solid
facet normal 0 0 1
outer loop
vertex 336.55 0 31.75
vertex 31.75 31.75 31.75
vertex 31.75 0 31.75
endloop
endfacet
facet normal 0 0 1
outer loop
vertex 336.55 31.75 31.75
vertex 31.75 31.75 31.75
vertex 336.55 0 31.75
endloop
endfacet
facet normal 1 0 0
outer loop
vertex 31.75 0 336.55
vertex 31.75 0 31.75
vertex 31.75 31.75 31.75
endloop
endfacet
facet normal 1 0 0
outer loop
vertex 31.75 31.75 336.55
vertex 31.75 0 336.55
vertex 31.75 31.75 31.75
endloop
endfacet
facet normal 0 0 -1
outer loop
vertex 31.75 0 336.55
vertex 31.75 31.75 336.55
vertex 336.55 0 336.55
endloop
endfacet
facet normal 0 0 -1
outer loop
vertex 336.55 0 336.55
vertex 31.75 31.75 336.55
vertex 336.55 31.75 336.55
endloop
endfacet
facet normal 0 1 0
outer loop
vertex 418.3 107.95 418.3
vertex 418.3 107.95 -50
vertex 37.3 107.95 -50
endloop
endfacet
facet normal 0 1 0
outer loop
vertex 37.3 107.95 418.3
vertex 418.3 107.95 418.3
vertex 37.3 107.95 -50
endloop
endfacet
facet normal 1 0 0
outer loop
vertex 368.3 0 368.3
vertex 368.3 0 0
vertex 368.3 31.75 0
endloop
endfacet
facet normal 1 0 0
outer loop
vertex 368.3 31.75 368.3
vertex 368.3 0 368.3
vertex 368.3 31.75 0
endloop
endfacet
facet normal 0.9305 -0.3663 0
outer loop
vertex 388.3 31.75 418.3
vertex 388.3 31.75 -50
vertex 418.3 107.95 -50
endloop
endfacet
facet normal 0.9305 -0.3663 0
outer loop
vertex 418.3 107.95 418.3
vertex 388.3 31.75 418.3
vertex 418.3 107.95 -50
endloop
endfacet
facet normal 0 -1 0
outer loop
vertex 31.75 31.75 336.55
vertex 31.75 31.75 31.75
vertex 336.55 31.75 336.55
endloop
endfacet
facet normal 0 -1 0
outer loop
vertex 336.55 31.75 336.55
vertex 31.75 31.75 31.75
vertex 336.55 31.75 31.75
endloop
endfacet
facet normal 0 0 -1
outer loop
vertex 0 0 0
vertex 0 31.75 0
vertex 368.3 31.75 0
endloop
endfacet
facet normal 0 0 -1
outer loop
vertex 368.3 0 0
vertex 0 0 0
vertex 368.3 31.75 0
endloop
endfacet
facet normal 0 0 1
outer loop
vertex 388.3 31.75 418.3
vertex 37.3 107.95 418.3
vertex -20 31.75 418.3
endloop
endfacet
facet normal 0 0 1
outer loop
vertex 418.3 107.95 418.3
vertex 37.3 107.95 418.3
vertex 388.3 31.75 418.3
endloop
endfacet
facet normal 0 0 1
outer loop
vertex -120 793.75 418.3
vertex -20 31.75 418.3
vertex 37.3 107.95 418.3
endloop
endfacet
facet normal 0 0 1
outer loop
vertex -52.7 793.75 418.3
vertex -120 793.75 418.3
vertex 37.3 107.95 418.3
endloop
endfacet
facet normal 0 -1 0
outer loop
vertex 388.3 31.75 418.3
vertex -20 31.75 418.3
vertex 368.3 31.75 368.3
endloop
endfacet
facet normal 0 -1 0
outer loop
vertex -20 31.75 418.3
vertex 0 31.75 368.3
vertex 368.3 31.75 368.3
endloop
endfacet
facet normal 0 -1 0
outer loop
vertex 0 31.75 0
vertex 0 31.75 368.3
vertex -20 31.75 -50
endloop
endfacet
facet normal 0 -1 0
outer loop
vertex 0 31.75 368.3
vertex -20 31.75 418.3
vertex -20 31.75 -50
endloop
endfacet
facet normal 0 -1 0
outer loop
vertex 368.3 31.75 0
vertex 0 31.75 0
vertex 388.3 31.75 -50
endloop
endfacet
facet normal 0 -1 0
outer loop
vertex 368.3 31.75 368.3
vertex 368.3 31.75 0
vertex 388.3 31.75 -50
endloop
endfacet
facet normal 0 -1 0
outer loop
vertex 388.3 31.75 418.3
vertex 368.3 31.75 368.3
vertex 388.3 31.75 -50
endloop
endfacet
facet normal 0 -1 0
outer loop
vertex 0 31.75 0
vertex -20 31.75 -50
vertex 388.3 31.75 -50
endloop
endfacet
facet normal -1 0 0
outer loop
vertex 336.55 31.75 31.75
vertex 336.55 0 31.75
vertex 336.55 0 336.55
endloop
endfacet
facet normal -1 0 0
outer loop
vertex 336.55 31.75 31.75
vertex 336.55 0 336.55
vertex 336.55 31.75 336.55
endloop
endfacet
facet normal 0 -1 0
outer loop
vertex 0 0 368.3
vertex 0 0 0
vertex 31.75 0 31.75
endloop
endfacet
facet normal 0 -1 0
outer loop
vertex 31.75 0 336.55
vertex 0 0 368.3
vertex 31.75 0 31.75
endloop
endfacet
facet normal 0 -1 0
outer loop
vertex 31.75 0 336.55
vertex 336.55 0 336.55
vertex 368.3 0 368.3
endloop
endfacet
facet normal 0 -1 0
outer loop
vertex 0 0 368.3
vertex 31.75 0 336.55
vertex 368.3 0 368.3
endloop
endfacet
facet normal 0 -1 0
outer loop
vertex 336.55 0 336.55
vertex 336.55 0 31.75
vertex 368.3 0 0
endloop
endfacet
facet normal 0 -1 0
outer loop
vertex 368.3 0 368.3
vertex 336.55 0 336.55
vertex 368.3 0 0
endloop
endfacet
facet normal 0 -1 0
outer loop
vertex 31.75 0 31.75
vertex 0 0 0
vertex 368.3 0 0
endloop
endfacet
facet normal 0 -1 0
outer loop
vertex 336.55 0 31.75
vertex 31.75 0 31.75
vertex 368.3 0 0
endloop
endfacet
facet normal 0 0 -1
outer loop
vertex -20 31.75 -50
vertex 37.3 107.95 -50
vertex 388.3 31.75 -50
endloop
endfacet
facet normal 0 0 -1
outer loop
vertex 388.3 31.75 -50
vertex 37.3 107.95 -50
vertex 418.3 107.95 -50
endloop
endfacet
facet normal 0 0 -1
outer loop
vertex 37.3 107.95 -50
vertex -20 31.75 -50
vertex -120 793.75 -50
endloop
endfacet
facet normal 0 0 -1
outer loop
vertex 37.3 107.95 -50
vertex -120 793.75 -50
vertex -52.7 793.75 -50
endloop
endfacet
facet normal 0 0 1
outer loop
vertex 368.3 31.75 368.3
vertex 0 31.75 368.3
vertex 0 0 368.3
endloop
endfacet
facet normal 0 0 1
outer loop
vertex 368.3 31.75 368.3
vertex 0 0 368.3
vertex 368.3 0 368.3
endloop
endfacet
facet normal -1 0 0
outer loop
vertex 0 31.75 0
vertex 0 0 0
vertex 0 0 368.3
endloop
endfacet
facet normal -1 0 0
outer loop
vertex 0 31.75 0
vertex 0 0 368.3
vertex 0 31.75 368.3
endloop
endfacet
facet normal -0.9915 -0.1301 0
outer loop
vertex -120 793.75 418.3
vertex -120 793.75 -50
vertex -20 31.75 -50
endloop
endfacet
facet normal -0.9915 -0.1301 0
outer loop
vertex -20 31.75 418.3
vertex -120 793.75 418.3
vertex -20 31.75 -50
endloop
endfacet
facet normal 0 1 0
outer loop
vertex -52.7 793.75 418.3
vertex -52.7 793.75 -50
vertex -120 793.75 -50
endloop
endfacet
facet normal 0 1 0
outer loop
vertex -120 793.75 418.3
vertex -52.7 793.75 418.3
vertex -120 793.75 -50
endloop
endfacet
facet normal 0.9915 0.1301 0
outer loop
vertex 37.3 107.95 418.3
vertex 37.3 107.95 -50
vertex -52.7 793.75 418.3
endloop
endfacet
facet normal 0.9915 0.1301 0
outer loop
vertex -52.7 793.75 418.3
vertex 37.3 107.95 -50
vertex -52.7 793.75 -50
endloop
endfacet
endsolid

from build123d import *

# Parameters (mm, degrees)
SKETCH1_W                = 368.3
SKETCH1_H                = 31.75
BOSS_EXTRUDE1_DEPTH      = 368.3
SHELL1_T                 = -31.75
BOSS_EXTRUDE2_DEPTH      = 418.3
BOSS_EXTRUDE2_DEPTH_BACK = 50


with BuildPart() as part:
    # Sketch1 → Boss-Extrude1 (new body)
    with BuildSketch(Plane.XY):
        with Locations((184.15, 15.875)):
            Rectangle(SKETCH1_W, SKETCH1_H)
    extrude(amount=BOSS_EXTRUDE1_DEPTH)

    # Shell1
    shell1_openings = [part.faces().sort_by_distance(p)[0] for p in [
        (184.15, 31.75, 184.15),
        (184.15, 0, 184.15),
    ]]
    offset(amount=SHELL1_T, openings=shell1_openings, kind=Kind.INTERSECTION)

    # Sketch2 → Boss-Extrude2 (add, two sides: drawn at the far end of the back side and taken through both)
    with BuildSketch(Plane.XY.offset(-BOSS_EXTRUDE2_DEPTH_BACK)):
        Polygon((368.3, 31.75), (388.3, 31.75), (418.3, 107.95), (37.3, 107.95), (-52.7, 793.75), (-120, 793.75), (-20, 31.75), (0, 31.75), align=None)
    extrude(amount=BOSS_EXTRUDE2_DEPTH + BOSS_EXTRUDE2_DEPTH_BACK)


solid = part.part
